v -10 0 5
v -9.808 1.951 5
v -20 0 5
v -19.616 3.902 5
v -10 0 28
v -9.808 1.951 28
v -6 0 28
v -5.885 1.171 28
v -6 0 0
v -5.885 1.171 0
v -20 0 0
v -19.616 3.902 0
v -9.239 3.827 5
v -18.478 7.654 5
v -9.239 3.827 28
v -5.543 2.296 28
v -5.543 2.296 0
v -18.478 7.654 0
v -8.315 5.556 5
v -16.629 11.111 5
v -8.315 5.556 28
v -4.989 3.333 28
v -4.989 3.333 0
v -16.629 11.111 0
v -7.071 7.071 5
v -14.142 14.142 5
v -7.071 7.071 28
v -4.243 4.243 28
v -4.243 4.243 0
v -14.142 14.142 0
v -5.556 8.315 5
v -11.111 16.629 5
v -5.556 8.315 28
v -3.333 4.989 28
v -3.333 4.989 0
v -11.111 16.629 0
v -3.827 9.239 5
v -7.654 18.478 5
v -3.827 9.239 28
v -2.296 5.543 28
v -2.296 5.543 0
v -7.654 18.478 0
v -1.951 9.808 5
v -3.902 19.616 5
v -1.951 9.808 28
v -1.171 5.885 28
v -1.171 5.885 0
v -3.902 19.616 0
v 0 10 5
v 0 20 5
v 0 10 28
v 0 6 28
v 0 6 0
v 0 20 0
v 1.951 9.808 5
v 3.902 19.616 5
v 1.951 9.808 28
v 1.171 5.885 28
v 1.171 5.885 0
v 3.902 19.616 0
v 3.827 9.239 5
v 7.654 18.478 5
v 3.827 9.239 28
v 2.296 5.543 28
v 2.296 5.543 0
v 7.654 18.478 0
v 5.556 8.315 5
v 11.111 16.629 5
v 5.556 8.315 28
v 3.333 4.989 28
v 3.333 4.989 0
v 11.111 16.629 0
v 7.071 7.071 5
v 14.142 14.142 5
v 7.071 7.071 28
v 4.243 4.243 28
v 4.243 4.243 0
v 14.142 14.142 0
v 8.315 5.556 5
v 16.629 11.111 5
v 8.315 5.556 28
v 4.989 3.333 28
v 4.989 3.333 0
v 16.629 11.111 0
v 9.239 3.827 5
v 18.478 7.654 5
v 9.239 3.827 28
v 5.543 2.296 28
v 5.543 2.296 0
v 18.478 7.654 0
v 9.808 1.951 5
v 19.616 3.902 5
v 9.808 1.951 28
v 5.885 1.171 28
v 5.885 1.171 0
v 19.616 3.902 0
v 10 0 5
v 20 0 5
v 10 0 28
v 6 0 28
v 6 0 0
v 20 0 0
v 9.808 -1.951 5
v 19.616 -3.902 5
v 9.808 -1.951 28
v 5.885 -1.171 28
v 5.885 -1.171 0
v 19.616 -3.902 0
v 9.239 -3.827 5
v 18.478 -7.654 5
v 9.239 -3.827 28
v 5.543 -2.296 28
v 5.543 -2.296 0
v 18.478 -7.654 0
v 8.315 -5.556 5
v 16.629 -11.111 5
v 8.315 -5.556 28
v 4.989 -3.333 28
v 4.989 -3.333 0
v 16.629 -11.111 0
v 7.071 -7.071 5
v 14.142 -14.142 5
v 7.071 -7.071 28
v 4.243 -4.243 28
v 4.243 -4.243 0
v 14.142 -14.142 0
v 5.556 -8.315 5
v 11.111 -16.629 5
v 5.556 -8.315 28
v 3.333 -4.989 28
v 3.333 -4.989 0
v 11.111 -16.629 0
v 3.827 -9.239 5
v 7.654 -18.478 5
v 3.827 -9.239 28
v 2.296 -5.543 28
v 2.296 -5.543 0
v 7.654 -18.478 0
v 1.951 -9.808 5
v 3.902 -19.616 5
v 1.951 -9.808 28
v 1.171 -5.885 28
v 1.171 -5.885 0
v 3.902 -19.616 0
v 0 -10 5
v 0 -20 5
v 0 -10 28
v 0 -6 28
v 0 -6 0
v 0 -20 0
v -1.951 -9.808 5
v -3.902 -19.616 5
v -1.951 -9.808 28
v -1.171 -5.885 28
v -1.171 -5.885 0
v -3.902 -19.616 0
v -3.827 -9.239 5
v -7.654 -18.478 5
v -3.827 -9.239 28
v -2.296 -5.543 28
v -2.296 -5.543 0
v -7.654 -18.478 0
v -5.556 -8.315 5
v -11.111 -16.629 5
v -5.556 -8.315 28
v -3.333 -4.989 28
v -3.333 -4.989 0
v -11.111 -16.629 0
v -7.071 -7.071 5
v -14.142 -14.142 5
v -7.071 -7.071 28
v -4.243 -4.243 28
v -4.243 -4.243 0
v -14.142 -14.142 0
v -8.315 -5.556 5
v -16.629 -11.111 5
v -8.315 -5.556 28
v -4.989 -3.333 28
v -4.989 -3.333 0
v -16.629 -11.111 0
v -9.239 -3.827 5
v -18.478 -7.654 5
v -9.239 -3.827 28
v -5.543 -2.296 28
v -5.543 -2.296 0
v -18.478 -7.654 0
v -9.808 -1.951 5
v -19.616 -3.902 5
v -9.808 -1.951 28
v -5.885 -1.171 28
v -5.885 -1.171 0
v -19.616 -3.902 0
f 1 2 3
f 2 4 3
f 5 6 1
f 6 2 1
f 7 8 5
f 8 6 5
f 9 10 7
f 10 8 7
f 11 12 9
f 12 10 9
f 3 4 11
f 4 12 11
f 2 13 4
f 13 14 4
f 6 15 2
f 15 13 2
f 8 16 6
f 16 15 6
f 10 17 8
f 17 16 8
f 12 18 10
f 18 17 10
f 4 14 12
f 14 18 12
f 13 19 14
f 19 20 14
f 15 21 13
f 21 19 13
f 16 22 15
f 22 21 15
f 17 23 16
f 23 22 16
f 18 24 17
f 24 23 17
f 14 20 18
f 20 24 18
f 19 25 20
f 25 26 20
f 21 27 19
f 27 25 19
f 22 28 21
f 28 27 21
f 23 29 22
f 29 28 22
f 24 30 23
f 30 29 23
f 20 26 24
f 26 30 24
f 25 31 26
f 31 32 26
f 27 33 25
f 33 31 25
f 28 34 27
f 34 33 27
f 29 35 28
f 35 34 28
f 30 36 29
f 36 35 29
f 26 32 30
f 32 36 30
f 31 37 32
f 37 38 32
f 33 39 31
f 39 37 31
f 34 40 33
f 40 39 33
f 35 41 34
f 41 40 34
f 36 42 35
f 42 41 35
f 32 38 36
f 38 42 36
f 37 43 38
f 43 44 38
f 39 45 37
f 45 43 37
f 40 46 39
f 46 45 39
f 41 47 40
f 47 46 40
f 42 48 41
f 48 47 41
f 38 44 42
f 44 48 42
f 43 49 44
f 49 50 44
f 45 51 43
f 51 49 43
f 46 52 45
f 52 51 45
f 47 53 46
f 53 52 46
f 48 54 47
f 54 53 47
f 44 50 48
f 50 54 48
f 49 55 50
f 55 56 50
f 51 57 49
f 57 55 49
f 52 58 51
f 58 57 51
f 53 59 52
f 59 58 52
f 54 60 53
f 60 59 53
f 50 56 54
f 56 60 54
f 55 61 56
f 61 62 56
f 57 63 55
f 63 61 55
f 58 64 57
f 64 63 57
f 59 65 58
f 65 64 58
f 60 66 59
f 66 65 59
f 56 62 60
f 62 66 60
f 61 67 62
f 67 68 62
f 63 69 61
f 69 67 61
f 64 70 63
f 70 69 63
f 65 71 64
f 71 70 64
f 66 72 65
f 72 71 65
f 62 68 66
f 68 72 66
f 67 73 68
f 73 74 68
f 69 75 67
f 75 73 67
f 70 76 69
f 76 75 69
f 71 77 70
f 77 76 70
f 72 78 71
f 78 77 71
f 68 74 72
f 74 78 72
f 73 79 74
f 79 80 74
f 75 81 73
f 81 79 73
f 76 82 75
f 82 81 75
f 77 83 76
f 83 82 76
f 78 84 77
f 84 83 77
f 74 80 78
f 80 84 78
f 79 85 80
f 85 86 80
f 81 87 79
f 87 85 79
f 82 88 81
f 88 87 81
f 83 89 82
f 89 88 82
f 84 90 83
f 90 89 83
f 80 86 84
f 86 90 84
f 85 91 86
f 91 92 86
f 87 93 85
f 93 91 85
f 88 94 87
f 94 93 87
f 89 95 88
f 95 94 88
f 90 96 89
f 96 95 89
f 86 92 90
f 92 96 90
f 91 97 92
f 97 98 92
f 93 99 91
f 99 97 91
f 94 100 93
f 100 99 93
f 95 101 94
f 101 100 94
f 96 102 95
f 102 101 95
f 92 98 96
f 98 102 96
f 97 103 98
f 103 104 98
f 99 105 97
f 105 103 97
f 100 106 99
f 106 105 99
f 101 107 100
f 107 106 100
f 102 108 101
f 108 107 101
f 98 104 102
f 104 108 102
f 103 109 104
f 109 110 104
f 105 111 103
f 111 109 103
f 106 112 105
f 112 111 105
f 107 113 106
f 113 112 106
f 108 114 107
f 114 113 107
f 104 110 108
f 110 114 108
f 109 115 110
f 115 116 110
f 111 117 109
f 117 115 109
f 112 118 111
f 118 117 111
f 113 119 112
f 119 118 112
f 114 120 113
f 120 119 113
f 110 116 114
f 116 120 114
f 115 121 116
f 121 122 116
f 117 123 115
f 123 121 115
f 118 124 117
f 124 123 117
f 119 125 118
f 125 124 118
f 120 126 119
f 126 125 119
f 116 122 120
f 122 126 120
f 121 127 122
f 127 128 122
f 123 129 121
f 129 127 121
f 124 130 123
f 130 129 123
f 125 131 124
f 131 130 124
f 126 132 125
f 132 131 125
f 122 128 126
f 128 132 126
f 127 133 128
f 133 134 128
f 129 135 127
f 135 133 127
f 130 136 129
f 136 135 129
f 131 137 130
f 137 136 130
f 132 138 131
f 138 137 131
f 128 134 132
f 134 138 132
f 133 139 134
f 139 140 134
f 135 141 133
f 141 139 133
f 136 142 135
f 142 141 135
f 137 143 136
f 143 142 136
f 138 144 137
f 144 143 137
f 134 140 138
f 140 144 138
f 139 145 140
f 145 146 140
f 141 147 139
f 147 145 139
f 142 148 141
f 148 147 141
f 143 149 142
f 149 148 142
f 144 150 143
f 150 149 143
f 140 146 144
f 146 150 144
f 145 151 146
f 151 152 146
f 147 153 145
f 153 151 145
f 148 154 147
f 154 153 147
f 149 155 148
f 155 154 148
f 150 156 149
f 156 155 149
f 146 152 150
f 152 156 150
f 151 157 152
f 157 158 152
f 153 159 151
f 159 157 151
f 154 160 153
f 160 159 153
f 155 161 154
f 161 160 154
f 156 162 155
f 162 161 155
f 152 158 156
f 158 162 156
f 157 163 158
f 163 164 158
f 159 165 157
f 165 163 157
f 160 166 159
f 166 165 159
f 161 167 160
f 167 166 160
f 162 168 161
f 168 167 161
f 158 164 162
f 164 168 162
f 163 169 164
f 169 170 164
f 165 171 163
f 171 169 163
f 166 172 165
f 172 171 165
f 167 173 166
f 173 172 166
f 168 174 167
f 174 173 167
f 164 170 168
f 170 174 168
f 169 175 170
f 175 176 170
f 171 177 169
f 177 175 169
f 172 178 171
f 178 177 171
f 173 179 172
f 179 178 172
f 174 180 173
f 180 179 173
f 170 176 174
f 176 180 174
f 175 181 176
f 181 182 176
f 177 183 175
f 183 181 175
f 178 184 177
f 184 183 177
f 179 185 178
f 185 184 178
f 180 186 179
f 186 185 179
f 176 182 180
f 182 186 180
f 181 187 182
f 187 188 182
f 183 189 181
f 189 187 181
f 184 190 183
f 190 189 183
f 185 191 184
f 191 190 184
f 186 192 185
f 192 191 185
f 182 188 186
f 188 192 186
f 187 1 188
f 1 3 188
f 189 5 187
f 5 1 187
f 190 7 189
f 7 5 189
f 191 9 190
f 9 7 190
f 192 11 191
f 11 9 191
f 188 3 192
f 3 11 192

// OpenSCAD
$fn = 32;

// ----------------------------------------------------------------------
// Revolved part: flanged bushing R20
// ----------------------------------------------------------------------

// --- parameters (mm) ---
bore_r = 6;               // bore radius
flange_r = 20;            // flange radius
flange_h = 5;             // flange thickness
sleeve_r = 10;            // sleeve radius
total_h = 28;             // overall height
revolve_angle = 360;      // revolve sweep, degrees

bore_d = 2 * bore_r;
flange_d = 2 * flange_r;
sleeve_d = 2 * sleeve_r;

profile = [[6, 0], [20, 0], [20, 5], [10, 5], [10, 28], [6, 28]];  // primary outline, 6 points, counter clockwise

// --- the one profile operation ---
rotate_extrude(angle = revolve_angle) polygon(points = profile);
